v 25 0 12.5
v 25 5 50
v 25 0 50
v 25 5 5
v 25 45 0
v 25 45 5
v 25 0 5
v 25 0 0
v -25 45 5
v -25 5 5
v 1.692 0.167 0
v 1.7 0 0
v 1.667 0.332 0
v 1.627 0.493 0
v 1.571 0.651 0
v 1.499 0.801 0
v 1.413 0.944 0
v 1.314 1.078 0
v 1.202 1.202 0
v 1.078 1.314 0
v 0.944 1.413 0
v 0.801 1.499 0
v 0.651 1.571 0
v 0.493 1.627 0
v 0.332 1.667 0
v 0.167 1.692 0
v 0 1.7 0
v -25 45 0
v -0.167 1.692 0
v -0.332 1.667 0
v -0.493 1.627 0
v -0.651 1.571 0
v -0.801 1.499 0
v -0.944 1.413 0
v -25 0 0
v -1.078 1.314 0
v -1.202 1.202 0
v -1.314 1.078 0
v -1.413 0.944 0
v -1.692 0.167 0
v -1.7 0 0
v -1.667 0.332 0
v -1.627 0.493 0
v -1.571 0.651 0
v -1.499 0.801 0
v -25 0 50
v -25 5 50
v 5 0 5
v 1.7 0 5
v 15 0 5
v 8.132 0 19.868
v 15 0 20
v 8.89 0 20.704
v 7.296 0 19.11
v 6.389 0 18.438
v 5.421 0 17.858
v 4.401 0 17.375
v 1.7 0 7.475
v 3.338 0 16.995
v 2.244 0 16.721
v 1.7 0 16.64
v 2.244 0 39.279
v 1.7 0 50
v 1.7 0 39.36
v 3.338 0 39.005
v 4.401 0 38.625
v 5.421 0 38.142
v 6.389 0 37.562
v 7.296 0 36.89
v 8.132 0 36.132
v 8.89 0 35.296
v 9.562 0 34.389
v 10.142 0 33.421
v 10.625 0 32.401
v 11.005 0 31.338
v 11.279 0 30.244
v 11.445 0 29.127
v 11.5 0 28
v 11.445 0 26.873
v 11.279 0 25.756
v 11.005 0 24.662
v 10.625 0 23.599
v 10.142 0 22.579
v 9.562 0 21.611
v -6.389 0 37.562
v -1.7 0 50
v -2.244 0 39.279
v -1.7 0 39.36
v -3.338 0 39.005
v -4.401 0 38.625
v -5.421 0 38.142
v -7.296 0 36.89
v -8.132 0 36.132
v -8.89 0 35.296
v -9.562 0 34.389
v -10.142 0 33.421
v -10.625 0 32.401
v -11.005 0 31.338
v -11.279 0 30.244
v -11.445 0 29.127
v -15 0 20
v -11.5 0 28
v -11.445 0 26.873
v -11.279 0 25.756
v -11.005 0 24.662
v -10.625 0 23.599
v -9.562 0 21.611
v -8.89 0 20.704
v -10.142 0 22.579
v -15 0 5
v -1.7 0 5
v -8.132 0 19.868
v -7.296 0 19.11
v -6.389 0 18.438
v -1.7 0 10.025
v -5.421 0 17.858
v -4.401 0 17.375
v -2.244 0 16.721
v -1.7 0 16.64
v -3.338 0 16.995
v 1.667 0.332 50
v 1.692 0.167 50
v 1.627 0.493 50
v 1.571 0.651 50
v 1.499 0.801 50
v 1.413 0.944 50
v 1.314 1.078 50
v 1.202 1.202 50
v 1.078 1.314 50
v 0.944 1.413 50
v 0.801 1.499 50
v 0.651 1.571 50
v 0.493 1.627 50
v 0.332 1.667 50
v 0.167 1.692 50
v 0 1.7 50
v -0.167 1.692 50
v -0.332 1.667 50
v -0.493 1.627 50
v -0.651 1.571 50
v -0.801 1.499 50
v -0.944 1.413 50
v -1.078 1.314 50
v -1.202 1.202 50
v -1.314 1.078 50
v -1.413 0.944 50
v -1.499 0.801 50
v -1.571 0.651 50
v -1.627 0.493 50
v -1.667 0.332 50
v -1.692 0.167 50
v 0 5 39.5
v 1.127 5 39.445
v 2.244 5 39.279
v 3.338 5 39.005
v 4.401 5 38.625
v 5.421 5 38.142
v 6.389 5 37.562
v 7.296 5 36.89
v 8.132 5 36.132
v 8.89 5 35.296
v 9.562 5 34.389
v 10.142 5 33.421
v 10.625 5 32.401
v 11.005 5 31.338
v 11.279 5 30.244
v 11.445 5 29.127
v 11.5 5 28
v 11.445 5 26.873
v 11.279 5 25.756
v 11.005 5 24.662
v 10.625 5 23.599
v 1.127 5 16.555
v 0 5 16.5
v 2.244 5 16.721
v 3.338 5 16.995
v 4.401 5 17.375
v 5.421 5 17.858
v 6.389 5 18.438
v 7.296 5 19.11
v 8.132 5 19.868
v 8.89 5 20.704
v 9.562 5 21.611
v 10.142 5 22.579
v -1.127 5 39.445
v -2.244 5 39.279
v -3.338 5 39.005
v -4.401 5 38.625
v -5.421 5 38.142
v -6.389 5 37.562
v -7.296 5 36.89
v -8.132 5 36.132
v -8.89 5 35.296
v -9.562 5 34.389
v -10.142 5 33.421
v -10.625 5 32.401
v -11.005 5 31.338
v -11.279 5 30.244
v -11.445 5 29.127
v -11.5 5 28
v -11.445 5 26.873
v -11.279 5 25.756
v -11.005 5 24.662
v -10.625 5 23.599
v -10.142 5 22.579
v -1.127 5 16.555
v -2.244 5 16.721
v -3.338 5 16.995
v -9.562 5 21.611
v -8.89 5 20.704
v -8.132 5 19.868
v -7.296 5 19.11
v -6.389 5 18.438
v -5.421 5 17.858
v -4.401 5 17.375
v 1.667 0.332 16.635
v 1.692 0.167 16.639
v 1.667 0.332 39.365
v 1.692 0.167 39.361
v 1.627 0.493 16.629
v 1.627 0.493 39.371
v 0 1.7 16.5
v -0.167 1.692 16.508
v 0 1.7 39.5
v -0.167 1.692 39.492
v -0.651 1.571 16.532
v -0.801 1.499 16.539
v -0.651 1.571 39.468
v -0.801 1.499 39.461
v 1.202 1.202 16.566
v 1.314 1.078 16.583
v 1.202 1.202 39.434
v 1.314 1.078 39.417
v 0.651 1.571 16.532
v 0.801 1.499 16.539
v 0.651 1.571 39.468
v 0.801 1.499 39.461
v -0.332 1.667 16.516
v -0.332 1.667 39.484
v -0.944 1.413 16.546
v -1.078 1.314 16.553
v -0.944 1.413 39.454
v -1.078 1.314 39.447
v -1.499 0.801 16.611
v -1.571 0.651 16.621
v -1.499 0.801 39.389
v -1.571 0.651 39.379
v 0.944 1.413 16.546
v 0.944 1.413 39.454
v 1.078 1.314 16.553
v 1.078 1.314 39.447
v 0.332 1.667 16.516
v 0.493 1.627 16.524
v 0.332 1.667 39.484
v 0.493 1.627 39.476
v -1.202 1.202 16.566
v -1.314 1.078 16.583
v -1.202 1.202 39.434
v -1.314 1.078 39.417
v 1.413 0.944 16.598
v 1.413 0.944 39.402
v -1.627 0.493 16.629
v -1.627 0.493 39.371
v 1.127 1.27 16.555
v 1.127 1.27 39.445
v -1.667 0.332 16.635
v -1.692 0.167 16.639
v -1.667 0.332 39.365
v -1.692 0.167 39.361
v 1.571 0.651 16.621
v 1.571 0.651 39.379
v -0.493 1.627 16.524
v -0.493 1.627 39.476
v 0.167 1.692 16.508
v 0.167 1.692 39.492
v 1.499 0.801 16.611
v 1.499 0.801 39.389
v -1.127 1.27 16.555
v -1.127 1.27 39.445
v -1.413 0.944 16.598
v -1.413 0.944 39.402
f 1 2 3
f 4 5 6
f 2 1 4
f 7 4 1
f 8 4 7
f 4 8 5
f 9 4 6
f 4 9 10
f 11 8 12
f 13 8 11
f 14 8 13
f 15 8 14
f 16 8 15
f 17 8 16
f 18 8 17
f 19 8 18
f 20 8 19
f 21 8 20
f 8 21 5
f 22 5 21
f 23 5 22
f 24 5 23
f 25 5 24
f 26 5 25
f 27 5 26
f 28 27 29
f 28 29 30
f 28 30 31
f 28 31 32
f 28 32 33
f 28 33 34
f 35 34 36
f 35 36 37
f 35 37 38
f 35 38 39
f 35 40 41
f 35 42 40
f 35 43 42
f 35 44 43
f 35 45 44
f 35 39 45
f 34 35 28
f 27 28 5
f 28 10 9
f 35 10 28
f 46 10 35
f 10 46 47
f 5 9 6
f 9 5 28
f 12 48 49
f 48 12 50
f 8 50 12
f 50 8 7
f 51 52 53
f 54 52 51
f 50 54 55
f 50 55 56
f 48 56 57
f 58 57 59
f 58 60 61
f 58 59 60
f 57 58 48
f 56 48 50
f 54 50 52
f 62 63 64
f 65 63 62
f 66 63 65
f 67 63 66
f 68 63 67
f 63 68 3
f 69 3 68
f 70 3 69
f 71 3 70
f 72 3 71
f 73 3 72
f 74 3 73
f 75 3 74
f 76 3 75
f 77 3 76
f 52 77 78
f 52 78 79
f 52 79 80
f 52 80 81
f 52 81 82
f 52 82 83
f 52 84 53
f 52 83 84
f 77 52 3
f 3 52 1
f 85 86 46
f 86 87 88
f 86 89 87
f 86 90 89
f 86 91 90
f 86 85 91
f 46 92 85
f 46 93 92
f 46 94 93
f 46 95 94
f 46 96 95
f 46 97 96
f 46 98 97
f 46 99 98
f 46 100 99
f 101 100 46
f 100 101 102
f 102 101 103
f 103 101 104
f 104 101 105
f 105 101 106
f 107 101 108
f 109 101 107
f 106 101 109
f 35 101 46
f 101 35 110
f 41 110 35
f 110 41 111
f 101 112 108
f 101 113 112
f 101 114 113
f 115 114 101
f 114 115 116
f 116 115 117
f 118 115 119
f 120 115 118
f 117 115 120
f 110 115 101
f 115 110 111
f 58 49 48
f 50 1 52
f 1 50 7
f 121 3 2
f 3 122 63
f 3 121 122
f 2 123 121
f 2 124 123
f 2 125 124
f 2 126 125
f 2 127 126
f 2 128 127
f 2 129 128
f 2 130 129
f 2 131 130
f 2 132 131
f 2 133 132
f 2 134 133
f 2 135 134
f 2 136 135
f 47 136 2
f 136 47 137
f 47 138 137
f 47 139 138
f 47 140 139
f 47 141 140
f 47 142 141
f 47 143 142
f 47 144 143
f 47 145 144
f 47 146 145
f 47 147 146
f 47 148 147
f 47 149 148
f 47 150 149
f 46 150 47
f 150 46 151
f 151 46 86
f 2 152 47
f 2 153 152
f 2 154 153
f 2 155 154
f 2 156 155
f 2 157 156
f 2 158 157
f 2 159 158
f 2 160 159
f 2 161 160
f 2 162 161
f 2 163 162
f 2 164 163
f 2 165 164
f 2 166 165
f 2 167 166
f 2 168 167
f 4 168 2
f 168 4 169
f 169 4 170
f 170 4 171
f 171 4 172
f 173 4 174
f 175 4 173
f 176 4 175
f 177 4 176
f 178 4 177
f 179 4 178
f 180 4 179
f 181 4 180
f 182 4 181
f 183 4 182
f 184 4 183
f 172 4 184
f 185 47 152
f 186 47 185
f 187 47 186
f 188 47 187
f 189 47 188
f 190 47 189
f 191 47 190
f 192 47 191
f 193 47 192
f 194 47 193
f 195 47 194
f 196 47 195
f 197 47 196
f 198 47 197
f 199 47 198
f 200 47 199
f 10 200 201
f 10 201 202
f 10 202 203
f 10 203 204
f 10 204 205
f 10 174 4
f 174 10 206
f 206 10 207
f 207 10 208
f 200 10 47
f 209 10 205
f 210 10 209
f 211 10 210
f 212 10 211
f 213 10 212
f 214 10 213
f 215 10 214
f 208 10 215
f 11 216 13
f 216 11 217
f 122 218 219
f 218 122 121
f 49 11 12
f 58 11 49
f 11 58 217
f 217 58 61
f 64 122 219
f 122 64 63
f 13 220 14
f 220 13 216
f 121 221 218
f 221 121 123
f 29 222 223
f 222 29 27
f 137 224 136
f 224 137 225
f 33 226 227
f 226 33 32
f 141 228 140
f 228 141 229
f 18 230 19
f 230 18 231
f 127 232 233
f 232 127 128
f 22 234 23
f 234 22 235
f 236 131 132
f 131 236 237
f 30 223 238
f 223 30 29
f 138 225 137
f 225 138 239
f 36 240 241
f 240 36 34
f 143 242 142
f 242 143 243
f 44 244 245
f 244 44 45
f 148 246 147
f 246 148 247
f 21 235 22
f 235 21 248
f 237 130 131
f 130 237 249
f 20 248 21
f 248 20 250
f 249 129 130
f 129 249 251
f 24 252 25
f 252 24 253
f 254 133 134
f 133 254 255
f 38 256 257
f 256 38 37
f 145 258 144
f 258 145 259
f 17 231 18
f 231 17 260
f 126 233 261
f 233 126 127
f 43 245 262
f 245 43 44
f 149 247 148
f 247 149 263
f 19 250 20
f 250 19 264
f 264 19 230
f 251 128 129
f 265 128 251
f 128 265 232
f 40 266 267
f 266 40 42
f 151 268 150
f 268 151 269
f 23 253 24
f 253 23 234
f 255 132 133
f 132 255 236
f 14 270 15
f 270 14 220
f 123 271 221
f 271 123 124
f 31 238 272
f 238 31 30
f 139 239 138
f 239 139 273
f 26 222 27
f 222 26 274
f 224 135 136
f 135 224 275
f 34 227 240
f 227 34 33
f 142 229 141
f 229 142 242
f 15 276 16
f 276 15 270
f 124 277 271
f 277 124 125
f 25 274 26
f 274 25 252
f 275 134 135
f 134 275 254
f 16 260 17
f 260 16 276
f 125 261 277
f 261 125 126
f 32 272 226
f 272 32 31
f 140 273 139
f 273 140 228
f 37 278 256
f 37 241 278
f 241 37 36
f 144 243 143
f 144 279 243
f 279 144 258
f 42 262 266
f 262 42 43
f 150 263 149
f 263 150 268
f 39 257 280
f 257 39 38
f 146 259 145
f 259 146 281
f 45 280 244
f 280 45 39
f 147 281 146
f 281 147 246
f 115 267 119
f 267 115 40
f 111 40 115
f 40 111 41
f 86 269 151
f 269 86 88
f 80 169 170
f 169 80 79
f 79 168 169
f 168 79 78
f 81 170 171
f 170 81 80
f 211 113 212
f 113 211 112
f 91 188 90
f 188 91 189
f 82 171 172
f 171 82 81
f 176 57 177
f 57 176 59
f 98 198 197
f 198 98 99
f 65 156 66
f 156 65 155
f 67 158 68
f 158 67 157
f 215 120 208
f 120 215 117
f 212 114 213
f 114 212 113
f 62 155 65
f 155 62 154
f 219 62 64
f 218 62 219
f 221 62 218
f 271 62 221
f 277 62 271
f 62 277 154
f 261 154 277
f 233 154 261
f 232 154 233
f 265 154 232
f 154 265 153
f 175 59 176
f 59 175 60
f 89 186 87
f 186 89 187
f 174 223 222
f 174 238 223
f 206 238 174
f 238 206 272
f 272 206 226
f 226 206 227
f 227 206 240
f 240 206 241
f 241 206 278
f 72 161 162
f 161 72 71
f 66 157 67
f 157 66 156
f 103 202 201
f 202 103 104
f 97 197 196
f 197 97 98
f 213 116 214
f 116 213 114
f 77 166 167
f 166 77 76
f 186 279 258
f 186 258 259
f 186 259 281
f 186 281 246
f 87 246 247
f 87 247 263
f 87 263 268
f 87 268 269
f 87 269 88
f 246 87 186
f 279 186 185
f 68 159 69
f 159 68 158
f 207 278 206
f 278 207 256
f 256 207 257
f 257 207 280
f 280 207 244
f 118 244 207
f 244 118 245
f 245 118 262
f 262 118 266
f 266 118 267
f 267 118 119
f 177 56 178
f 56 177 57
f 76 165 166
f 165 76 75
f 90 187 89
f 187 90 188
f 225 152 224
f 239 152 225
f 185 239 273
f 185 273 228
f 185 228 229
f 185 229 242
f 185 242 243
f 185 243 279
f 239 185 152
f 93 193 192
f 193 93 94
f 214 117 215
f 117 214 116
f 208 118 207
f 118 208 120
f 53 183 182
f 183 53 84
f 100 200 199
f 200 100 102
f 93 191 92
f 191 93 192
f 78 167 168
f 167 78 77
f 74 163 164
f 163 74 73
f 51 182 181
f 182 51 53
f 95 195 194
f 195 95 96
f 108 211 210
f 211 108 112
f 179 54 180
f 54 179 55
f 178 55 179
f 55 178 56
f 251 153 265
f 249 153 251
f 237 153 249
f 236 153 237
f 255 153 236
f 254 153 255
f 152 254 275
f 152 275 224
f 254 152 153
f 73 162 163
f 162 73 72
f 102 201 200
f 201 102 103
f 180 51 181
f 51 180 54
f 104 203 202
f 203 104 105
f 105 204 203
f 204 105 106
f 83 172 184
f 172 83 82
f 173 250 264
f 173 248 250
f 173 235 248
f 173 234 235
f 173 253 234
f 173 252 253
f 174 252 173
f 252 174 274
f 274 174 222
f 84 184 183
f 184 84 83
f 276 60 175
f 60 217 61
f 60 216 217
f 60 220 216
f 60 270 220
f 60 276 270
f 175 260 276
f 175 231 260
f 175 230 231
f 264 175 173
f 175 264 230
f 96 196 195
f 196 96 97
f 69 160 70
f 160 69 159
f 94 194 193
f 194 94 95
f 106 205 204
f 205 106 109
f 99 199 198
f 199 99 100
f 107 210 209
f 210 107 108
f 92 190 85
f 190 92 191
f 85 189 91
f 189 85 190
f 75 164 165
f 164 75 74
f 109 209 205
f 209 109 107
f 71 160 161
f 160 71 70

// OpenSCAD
// L-shaped mounting bracket for NEMA 17 stepper motor (e.g. syringe pump)
// Print orientation: base plate on bed, motor plate builds upward (+Z)

$fn = 64;

// ---- Base plate ----
base_x = 25;              // plate spans x = -25 .. 25
base_y = 45;              // plate spans y = 0 .. 45
base_t = 5;               // plate thickness (z = 0 .. 5)

// ---- Motor plate ----
motor_x = 25;             // plate spans x = -25 .. 25
motor_y = 5;              // plate spans y = 0 .. 5
motor_h = 50;             // plate height (z = 0 .. 50)

// ---- Boss hole (motor centring boss) ----
boss_d = 23;              // hole diameter
boss_x = 0;               // hole centre x
boss_z = 28;              // hole centre z

// ---- Screw holes (M3, on square pattern) ----
screw_d = 3.4;            // hole diameter
screw_n = 4;              // number of holes
screw_a = 31;             // square pattern size (centre to centre)
screw_z = 28;             // hole centre z (same as boss)

// ---- Gussets ----
gusset_t = 5;             // gusset thickness (X)
gusset_l = 20;            // leg length along +Y
gusset_h = 20;            // leg length along +Z
gusset_x0 = -25;          // left gusset start (x = -25 .. -20)

// ---- Misc ----
eps = 0.5;                // cutter overshoot past faces

difference() {
    union() {
        // Base plate
        translate([-base_x, 0, 0])
            cube([2 * base_x, base_y, base_t]);

        // Motor plate, standing on the back edge of the base
        translate([-motor_x, 0, 0])
            cube([2 * motor_x, motor_y, motor_h]);
    }

    // Boss hole through motor plate (along Y)
    translate([boss_x, -eps, boss_z])
        rotate([-90, 0, 0])
            cylinder(d = boss_d, h = motor_y + 2 * eps);

    // M3 screw holes on 31 mm square pattern, centred on boss hole
    for (i = [0 : screw_n - 1]) {
        rotate([0, 0, i * 90])
            translate([0, 0, -eps])
                cylinder(d = screw_d, h = motor_h + 2 * eps);
    }

    // Triangular gussets, flush with left and right edges
    // Right triangle in YZ plane: legs along +Y and +Z, right angle at (y=5, z=5)
    for (sx = [-1, 1])
        translate([sx * (25 - gusset_l / 2), 0, 0])
            rotate([90, 0, 0])
                linear_extrude(height = gusset_t)
                    polygon(points = [[0, 5], [gusset_l, 5], [0, gusset_h]]);
}
